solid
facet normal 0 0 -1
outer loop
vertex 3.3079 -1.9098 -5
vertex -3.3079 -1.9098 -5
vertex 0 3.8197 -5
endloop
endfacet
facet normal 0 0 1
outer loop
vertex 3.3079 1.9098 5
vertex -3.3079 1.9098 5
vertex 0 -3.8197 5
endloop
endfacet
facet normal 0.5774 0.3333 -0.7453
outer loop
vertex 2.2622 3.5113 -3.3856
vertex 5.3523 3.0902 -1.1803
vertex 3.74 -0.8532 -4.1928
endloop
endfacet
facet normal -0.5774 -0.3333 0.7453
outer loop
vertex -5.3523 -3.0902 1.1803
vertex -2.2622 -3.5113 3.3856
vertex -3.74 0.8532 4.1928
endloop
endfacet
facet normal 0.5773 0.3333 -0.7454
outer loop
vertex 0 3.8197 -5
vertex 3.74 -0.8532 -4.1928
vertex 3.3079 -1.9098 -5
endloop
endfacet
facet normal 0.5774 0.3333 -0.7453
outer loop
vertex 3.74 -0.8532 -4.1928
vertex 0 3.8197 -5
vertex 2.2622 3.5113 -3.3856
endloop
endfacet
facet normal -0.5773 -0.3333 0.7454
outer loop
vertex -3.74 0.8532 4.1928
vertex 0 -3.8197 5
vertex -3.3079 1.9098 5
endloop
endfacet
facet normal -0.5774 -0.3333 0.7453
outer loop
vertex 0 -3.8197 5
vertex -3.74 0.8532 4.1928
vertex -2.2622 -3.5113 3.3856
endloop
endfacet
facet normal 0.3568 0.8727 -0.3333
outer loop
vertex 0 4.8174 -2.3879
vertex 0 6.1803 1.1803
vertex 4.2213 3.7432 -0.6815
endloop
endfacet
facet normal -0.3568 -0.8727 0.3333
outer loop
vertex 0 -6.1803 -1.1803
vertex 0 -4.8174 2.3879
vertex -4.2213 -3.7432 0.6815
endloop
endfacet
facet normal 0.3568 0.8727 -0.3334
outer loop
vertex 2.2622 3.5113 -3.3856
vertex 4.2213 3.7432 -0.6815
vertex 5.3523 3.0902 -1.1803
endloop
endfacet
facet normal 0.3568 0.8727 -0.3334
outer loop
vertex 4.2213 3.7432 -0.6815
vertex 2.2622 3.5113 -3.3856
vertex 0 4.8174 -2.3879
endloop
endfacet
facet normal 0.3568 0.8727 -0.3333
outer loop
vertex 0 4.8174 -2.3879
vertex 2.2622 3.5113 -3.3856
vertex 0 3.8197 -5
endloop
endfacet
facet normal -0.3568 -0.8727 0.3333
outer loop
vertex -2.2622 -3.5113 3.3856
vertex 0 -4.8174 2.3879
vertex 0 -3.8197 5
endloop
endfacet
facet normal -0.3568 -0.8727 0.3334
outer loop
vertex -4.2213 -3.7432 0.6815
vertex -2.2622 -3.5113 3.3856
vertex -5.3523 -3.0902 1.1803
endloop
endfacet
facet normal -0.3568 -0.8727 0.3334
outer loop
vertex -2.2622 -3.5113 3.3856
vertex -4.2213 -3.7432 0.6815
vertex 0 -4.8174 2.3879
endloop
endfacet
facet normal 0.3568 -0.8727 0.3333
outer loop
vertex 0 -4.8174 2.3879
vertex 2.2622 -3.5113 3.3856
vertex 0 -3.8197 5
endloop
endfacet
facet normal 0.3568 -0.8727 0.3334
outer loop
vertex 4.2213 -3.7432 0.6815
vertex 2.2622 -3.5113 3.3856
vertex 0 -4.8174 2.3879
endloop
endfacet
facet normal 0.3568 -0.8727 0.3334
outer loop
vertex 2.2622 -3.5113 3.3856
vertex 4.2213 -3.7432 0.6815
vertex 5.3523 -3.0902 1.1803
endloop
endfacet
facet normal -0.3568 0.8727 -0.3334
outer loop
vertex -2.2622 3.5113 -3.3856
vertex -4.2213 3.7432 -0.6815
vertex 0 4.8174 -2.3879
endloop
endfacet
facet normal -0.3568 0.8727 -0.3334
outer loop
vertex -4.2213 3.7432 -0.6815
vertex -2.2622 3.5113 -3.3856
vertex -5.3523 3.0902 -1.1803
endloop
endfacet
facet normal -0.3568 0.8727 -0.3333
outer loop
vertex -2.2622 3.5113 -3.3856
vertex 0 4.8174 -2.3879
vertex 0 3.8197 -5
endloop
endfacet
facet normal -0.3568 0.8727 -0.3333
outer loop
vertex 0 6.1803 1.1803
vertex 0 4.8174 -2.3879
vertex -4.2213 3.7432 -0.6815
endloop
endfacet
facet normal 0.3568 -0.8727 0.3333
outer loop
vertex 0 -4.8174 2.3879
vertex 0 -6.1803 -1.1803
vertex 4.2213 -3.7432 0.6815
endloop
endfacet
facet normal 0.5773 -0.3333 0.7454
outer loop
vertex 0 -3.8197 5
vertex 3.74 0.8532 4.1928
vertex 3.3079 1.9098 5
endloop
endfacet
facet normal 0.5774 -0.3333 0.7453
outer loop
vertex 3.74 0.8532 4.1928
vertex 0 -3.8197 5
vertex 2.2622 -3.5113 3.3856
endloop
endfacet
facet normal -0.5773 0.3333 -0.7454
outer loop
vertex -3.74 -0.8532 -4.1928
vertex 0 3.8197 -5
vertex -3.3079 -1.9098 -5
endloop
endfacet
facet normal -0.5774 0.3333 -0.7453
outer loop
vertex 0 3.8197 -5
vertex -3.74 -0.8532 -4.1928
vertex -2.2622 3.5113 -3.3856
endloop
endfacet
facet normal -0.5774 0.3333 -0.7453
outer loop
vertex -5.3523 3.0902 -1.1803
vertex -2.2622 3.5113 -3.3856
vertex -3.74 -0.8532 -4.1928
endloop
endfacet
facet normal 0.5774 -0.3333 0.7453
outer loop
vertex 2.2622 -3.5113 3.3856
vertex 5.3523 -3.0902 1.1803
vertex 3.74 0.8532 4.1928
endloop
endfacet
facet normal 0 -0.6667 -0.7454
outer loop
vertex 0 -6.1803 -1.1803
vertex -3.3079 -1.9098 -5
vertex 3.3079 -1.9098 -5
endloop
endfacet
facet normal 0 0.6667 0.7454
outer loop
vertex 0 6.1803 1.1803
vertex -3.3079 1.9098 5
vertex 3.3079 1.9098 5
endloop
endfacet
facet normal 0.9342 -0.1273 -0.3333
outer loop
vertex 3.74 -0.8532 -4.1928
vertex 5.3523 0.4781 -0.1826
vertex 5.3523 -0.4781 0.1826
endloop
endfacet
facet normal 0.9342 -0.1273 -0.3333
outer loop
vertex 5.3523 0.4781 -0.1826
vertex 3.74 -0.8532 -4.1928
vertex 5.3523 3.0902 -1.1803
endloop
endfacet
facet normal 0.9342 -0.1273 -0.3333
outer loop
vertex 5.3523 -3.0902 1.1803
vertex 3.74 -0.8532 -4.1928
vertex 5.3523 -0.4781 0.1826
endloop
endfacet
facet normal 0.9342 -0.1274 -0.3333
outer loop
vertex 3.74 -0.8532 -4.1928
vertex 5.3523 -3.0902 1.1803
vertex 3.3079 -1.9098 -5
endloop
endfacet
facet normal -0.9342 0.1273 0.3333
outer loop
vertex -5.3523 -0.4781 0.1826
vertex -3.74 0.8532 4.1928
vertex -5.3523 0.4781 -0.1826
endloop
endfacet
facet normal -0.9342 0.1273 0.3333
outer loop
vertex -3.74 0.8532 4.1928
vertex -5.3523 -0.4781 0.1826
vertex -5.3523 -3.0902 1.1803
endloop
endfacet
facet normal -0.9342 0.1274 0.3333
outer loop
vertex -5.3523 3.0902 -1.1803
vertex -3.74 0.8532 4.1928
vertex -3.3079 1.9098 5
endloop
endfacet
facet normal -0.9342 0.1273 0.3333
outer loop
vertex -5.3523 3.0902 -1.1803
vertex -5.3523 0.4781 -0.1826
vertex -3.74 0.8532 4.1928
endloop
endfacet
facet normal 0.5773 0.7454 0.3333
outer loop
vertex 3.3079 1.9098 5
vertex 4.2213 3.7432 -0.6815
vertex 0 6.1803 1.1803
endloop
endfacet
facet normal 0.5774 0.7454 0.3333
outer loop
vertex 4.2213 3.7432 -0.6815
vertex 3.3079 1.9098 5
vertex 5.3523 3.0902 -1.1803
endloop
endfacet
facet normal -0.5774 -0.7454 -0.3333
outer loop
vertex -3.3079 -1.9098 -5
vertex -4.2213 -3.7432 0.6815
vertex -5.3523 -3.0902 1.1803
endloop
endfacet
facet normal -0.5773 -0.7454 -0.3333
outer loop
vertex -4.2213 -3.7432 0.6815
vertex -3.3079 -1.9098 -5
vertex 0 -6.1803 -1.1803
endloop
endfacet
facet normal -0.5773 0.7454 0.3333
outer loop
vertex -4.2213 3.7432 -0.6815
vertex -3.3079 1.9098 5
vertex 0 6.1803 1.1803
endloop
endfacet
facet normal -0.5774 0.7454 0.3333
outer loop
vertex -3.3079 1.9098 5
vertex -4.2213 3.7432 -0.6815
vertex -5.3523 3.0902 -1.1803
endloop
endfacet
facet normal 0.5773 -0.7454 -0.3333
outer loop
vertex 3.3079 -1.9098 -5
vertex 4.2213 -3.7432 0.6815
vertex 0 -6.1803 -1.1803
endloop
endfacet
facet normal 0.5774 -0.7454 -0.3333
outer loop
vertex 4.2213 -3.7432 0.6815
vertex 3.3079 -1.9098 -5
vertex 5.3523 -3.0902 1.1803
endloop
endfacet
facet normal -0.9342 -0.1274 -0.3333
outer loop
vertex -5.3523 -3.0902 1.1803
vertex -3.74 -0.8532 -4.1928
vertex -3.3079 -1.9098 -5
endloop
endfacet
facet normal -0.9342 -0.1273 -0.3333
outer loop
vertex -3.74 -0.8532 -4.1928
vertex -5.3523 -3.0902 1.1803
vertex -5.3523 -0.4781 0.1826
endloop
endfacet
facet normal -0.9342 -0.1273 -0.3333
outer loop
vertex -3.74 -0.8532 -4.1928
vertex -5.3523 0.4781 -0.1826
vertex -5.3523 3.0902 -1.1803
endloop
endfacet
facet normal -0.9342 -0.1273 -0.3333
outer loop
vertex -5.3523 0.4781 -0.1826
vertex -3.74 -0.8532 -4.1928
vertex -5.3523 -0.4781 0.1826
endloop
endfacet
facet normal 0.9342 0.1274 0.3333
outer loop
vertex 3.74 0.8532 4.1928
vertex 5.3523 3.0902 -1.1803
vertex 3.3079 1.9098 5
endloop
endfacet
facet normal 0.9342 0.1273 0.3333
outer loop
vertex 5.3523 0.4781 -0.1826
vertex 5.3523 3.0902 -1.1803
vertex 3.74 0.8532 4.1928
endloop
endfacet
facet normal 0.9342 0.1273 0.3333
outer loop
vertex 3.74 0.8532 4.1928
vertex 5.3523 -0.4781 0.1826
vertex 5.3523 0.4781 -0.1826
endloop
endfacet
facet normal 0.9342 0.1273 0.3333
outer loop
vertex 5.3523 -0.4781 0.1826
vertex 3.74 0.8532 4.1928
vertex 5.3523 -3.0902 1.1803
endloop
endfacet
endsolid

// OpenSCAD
// 20面体骰子
module item(w=10,d=45,p=0){
    rotate([d,0,p])
        cube([w*2,w,w*2],center=true);
}

module dice_20(w=10){
    d=acos(tan(30)/tan(36));//acos(tan(54)/tan(60));
    f=asin(sin(54)/sin(60))*2;
    rotate([d,0,0])
        intersection(){
            intersection_for (a = [ 0 : 4 ])item(w,90-d,72*a);
            intersection_for (a = [ 0 : 4 ])item(w,f-d-90,72*a);
        };
}

w=10;
dice_20(w);
